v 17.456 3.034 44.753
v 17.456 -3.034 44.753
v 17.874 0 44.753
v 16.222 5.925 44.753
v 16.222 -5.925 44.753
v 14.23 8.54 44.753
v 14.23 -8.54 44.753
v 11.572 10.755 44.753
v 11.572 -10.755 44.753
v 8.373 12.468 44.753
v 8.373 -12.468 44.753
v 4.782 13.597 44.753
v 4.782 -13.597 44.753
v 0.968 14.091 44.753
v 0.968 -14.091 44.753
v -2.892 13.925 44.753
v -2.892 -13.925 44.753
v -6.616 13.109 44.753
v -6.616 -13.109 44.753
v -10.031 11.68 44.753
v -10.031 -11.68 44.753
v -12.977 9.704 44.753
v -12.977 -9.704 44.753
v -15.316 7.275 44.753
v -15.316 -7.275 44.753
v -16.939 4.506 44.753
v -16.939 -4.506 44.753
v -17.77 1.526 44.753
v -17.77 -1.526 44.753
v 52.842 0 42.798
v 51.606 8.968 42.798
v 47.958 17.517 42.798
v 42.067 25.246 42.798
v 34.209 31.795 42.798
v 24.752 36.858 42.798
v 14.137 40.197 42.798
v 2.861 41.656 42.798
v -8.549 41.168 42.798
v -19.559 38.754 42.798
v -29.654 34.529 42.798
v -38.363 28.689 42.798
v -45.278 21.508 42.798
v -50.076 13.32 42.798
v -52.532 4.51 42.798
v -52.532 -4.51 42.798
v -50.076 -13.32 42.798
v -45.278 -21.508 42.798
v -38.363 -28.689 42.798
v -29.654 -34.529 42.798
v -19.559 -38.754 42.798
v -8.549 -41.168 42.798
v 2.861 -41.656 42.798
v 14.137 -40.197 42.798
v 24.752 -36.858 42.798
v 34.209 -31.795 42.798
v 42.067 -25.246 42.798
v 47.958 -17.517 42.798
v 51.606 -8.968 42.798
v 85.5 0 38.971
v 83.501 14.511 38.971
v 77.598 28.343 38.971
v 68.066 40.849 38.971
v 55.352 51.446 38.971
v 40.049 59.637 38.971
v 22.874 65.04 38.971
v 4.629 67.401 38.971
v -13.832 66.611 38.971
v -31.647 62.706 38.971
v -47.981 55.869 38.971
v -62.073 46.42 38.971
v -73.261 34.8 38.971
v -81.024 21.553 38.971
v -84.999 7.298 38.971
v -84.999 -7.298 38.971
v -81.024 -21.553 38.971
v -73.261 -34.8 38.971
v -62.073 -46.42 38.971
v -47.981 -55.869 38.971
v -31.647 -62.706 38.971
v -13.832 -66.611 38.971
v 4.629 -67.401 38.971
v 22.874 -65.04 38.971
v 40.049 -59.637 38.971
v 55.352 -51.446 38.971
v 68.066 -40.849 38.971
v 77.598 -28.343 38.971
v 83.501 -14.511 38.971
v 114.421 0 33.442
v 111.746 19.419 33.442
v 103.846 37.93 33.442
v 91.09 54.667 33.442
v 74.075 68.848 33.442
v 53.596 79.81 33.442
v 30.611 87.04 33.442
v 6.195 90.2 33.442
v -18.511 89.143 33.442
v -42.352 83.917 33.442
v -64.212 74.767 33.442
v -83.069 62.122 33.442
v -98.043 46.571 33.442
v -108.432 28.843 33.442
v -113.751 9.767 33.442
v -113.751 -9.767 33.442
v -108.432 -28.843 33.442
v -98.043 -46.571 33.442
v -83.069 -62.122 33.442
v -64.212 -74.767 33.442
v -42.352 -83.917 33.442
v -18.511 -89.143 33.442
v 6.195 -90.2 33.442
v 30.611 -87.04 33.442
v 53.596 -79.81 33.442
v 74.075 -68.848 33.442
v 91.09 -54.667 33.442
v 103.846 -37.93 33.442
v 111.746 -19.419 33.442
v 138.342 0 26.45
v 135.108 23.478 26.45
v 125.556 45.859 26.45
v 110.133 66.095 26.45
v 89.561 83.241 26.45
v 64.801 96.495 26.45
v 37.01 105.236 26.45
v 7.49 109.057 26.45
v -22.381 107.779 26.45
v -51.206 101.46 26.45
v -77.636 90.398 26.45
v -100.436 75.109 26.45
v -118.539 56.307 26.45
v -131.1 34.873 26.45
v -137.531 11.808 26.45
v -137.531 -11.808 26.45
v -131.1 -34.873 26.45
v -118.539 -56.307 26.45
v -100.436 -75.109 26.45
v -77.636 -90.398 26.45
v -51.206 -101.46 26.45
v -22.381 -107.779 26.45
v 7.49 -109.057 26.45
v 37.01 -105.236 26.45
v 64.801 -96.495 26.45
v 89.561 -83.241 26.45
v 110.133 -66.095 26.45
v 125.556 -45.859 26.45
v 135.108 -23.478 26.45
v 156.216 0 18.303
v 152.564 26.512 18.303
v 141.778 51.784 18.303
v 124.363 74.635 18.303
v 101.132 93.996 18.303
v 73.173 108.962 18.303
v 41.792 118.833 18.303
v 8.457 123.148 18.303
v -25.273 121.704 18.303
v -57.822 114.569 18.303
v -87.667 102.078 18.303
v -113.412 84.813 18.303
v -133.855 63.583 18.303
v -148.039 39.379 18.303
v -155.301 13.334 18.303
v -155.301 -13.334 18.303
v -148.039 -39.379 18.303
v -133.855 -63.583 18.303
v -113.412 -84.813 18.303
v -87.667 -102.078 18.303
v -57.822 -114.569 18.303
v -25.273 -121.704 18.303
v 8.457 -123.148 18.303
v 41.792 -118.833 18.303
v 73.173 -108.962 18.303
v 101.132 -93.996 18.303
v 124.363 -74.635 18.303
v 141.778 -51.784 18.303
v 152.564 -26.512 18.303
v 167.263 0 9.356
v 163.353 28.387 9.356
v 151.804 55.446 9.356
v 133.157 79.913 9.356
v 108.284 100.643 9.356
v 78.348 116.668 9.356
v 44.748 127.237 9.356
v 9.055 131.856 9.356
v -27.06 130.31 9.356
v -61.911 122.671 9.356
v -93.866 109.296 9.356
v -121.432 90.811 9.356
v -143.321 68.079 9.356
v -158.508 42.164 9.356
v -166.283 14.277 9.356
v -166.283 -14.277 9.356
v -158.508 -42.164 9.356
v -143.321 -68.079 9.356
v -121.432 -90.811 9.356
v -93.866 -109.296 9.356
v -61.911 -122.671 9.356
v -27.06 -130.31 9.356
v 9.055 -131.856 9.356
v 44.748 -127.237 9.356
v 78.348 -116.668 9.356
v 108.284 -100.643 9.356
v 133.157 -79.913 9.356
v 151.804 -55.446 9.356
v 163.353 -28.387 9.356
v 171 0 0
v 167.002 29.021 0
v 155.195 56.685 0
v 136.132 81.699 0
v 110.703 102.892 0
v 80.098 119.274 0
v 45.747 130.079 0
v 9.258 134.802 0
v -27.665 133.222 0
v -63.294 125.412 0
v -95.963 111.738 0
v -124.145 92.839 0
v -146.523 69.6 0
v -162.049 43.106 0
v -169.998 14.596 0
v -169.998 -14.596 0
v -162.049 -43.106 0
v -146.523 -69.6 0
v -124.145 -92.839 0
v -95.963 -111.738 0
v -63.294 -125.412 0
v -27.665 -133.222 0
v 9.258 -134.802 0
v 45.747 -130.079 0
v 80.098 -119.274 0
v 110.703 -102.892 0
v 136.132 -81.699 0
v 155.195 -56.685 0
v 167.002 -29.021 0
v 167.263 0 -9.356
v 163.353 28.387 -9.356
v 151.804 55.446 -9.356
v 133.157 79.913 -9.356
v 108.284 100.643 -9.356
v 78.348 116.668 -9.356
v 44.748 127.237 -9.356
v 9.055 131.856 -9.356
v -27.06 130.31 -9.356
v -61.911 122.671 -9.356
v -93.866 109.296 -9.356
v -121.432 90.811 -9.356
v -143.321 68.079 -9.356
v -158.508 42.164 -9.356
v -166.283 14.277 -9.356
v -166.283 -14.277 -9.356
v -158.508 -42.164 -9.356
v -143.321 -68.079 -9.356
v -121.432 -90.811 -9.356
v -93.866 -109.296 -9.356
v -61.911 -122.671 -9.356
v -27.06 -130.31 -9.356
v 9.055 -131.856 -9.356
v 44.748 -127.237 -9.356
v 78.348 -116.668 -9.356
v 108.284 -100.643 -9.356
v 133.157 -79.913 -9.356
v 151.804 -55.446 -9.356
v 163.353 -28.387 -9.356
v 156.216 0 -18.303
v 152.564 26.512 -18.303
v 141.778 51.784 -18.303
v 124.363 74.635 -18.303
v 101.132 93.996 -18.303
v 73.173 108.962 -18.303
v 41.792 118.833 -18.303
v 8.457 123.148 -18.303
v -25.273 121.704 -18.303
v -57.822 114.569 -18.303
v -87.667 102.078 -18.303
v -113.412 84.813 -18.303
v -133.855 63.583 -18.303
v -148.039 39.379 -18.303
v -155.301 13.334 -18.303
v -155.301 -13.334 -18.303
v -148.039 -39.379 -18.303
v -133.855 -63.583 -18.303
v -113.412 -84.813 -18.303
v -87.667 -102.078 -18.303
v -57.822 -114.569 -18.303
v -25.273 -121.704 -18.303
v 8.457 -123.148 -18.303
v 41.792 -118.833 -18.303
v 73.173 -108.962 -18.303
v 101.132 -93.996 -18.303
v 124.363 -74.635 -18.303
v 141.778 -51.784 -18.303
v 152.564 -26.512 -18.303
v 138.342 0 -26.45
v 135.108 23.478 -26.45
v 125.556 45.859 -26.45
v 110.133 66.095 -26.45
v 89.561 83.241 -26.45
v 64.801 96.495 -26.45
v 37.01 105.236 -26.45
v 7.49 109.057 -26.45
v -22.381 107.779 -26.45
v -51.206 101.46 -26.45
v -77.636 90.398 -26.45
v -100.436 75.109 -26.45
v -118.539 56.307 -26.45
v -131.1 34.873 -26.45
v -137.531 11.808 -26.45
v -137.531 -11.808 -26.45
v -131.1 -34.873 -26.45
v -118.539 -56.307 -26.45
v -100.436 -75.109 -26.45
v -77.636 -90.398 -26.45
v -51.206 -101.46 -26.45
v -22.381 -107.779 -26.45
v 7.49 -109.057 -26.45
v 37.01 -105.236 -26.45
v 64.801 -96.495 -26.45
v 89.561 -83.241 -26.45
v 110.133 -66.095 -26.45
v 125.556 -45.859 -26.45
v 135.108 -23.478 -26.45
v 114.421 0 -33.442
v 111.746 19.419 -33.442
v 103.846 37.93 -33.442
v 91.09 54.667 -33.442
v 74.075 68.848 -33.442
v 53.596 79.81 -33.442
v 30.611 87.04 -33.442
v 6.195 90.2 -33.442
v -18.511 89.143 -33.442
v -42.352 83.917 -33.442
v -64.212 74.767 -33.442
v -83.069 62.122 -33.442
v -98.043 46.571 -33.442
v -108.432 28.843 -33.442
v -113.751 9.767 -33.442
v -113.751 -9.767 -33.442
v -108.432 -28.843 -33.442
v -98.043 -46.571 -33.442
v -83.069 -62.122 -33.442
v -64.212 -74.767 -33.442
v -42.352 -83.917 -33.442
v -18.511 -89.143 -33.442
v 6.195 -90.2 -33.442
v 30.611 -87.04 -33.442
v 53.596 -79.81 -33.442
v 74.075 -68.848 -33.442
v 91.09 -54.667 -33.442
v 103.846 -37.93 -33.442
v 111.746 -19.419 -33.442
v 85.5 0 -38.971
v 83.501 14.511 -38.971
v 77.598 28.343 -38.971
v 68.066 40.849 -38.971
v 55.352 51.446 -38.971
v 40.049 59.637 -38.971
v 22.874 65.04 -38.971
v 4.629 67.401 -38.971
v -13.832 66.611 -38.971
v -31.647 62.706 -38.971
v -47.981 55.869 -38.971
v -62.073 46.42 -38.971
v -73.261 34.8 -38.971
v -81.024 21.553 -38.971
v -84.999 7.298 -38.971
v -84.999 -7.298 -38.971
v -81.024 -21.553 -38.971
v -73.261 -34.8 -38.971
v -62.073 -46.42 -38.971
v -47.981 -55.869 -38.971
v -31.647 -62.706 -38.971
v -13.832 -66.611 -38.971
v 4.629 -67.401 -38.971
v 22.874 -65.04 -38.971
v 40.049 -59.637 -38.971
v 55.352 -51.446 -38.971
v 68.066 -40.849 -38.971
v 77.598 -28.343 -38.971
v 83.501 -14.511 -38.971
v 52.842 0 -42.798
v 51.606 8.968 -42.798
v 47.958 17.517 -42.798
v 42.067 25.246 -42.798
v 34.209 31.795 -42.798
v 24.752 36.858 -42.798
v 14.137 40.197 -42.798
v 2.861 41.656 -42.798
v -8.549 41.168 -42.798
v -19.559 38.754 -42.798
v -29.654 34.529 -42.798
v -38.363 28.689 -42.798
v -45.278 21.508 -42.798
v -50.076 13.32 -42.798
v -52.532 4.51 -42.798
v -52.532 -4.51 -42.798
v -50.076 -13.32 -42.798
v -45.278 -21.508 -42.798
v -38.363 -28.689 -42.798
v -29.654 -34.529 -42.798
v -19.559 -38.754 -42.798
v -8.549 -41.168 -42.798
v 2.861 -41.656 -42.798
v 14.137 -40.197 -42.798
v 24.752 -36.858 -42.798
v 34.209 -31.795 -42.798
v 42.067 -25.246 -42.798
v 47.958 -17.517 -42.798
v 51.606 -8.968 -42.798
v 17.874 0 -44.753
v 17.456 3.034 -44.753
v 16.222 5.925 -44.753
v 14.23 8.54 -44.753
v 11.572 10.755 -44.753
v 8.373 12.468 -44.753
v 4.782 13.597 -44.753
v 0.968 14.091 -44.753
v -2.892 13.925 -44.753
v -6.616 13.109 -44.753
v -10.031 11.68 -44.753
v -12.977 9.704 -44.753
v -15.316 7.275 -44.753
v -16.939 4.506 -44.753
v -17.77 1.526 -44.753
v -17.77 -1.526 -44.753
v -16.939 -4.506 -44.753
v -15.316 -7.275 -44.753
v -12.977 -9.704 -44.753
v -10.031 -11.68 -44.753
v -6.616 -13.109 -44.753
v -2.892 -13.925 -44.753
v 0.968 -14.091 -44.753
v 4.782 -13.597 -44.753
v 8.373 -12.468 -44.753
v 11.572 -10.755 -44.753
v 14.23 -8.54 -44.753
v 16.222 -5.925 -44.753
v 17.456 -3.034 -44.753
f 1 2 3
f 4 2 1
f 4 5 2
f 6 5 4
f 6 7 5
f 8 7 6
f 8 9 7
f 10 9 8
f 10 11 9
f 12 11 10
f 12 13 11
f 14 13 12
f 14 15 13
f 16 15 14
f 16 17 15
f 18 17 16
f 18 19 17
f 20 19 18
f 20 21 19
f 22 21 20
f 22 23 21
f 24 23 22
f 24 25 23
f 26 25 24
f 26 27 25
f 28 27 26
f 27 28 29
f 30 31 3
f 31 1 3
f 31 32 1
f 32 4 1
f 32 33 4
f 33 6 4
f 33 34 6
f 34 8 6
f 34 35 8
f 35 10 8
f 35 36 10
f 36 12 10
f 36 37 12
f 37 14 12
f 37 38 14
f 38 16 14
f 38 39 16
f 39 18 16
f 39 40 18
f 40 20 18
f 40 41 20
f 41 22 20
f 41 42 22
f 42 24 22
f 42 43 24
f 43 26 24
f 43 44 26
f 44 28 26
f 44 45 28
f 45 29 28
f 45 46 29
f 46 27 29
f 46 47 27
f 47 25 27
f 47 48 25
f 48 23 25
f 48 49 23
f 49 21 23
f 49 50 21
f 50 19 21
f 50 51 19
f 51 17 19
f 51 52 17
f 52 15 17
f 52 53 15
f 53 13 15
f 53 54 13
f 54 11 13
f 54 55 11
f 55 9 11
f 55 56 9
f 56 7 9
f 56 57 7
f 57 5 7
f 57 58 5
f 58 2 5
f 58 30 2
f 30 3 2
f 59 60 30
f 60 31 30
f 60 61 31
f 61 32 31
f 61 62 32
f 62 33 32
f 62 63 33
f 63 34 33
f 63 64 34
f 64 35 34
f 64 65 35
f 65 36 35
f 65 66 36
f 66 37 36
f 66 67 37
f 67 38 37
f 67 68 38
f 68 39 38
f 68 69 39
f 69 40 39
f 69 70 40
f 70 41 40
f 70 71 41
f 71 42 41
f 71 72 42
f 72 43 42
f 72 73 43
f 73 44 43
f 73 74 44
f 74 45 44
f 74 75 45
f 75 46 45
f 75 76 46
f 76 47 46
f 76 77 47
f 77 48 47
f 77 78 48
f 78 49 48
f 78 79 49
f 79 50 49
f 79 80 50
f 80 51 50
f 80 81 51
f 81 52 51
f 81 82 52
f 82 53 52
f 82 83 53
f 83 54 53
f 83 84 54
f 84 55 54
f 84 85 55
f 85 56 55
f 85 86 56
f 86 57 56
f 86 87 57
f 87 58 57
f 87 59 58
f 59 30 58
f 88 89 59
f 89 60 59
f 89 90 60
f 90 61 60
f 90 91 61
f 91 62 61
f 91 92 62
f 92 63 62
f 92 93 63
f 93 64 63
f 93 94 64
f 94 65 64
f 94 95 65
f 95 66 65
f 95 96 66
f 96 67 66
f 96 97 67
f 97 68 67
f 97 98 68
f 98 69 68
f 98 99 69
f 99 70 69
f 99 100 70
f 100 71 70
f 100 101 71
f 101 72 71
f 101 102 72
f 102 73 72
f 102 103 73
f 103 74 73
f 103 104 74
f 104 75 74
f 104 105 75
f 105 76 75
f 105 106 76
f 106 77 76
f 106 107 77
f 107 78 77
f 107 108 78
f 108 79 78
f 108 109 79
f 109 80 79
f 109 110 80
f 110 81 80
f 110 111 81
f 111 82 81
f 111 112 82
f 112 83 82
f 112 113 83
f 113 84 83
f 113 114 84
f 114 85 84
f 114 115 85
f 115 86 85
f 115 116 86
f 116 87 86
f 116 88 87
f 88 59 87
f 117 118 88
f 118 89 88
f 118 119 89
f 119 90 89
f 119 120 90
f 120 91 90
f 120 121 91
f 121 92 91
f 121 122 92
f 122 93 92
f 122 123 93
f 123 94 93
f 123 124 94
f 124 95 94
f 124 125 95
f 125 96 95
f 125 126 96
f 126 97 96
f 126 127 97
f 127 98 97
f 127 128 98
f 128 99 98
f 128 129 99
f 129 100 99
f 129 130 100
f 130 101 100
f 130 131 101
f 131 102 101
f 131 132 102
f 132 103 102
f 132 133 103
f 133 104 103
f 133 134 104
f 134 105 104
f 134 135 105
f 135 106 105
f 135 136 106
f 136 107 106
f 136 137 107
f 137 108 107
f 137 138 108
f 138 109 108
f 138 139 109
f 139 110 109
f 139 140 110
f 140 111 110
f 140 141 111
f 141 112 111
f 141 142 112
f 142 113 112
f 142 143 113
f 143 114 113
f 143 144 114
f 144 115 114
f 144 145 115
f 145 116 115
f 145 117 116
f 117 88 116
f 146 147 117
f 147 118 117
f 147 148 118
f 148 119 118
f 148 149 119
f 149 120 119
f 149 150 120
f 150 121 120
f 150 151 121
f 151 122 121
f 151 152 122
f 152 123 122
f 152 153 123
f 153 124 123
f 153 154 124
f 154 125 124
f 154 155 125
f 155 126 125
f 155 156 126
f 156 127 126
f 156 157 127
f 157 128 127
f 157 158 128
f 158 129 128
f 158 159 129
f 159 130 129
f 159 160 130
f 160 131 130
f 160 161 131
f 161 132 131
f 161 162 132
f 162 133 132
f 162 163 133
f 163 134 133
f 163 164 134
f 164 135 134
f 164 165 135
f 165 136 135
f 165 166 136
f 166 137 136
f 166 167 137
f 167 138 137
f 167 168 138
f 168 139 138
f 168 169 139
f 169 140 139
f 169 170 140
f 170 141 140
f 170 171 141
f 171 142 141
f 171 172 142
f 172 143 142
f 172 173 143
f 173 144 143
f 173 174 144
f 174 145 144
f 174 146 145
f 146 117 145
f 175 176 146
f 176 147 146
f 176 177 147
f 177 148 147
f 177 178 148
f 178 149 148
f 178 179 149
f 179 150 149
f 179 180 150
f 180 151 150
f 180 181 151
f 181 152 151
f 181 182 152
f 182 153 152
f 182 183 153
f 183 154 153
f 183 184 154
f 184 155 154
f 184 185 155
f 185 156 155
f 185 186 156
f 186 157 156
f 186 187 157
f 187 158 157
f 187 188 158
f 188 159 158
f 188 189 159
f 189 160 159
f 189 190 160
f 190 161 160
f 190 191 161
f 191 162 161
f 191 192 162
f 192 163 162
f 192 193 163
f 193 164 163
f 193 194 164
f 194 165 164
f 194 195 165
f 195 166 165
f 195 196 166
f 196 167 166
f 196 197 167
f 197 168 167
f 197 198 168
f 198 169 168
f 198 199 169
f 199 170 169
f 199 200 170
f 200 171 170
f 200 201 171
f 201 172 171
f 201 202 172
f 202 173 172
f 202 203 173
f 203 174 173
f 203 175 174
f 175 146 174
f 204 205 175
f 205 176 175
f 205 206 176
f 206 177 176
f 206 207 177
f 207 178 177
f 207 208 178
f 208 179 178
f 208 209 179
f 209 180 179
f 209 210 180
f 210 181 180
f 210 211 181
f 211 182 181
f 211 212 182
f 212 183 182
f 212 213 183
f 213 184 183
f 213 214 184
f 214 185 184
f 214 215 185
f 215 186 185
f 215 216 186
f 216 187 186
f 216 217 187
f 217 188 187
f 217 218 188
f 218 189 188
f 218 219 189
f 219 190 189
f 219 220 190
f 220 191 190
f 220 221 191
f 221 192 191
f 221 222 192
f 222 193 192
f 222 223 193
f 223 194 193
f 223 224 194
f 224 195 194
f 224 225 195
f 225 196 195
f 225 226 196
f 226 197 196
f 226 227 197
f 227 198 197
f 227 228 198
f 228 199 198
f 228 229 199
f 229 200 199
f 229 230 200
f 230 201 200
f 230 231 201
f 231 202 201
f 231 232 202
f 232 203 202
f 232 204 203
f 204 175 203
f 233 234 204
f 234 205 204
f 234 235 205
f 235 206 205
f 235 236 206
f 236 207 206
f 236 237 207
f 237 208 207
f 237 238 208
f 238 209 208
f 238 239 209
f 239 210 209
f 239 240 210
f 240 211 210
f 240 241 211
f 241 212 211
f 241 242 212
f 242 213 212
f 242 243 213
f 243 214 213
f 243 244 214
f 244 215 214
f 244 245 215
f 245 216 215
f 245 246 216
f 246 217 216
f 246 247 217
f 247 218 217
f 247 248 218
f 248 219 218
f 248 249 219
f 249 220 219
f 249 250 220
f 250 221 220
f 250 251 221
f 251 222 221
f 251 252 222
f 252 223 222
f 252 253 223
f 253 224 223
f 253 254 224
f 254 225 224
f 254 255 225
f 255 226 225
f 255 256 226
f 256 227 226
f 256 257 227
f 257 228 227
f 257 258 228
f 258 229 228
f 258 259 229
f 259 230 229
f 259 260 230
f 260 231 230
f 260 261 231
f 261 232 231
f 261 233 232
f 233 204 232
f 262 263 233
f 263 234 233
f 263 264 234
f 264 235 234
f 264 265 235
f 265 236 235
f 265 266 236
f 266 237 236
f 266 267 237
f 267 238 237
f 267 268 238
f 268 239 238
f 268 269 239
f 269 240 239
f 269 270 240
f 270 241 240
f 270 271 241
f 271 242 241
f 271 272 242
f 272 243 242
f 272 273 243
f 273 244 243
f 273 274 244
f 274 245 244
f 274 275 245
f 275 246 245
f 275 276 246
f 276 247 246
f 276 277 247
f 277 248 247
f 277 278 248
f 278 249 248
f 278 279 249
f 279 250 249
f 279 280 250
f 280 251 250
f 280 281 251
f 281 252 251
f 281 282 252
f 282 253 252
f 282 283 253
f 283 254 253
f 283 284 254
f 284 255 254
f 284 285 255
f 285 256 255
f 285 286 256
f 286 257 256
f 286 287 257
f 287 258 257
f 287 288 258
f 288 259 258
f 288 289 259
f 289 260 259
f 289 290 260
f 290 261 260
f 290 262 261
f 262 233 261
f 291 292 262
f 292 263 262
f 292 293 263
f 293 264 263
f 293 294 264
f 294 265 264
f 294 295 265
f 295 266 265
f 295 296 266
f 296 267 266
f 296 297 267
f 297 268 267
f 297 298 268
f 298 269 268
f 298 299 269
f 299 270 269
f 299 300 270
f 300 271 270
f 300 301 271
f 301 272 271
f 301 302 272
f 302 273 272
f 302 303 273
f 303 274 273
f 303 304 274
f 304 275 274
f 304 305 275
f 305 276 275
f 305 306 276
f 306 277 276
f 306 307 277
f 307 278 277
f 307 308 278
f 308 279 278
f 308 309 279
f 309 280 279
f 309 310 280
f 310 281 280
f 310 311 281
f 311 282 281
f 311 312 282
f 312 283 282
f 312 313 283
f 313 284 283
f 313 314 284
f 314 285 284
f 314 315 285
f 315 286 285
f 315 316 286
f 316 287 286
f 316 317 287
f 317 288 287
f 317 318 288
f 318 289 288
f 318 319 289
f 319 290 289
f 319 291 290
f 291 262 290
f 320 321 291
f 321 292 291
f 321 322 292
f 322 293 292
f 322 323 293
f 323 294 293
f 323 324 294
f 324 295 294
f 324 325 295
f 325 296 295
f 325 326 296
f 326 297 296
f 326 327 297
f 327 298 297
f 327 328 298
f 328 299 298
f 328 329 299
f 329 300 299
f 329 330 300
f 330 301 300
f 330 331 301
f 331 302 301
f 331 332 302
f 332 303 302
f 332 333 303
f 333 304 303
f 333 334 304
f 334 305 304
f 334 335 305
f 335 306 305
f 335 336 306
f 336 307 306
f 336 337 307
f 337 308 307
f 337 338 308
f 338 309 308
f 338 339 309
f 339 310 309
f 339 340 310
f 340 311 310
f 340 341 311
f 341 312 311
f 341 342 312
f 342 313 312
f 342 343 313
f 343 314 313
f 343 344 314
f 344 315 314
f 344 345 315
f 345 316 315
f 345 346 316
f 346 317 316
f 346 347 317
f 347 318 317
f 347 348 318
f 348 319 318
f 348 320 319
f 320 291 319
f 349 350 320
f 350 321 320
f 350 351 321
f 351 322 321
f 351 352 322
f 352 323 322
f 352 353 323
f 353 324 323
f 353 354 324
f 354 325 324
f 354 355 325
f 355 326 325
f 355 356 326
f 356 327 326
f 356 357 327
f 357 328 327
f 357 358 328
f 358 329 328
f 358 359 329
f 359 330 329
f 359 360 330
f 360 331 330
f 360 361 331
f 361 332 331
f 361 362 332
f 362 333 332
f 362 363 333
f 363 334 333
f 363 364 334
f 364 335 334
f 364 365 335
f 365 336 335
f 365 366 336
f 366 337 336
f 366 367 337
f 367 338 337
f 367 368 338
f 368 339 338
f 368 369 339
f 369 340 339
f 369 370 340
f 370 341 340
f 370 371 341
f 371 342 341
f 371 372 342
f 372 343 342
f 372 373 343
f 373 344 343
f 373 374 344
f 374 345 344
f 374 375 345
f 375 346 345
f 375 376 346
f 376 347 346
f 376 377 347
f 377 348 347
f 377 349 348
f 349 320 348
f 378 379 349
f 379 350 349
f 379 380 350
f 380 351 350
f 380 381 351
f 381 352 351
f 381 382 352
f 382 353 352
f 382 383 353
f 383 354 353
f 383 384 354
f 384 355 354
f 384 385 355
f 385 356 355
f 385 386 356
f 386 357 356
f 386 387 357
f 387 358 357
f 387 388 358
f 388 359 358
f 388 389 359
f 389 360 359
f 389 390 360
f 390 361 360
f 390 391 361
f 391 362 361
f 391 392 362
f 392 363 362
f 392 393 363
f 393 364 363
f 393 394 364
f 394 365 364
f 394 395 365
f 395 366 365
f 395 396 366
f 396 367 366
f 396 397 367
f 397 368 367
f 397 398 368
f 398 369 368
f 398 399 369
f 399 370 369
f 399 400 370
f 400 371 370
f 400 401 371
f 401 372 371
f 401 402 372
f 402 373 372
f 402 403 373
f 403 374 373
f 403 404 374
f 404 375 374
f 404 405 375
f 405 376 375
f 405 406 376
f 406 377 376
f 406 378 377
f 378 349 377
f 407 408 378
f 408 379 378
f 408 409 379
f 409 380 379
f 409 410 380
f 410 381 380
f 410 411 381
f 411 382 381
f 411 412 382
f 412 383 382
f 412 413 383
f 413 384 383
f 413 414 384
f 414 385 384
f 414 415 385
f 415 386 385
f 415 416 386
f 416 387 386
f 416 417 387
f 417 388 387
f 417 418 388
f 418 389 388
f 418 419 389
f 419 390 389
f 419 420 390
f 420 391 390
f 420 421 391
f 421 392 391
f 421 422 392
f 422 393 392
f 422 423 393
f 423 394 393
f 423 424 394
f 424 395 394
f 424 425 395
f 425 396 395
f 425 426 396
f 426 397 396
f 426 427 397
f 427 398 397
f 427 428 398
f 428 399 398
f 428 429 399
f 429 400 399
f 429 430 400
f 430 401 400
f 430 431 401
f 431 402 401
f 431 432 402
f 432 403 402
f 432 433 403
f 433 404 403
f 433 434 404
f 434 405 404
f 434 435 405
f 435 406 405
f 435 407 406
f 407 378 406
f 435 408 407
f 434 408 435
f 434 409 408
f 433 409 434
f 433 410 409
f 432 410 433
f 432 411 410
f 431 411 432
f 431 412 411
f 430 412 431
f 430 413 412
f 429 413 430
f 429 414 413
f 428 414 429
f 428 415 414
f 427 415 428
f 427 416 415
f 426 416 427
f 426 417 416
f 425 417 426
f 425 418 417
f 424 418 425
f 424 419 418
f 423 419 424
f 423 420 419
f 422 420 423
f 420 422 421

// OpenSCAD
// Generated by SolidPython 1.0.1 on 2020-07-29 00:46:54


scale(v = [19, 15, 5]) {
	sphere(r = 9);
}
/***********************************************
*********      SolidPython code:      **********
************************************************
 
# import packages: SolidPython
from solid import *
from solid.utils import *
from itertools import chain, combinations, permutations


class Resize:

    def __init__(self, scad_file):
        self.scad_file = scad_file
        #self.scad_file = import_scad(scad_file)
        # cone/cylinder param:
        self.r1 = 0
        self.r2 = 0
        self.h = 0
        # rectangular prism param:
        self.w = 0
        self.l = 0
        # ellipse param:
        self.r = 0

    # import OpenScad code (file name corresponds to shape)


    # classify shape + parameters
    def assign(self, param1, param2, param3):
        if self.scad_file == 'cone.scad':
            self.r1 = param1
            self.r2 = param2
            self.h = param3
        elif self.scad_file == 'cylinder.scad':
            self.r1 = param1
            self.r2 = param2
            self.h = param3
        elif self.scad_file == 'rectangularPrism.scad':
            self.h = param1
            self.l = param2
            self.w = param3
        else:
            self.r = param1
            self.h = param2

    # resize parameters
    def iterate(self):
        x = range(3, 20, 2)
        i = 1
        if self.scad_file == 'cone.scad':
            tempList = list(permutations(x, 2))
            for temp in tempList:
                param1 = temp[0]
                param2 = temp[1]
                filepath = 'produced_scad_files/' + 'cone' + str(param1) + '_' + str(param2) + '_' + '.scad'
                scad_render_to_file(cylinder(h=param1, r1=param2, r2=0), filepath)

        elif self.scad_file == 'cylinder.scad':
            tempList = list(permutations(x, 3))
            for temp in tempList:
                param1 = temp[0]
                param2 = temp[1]
                filepath = 'produced_scad_files/' + 'cylinder' + str(param1) + '_' + str(param2) + '_' + '.scad'
                scad_render_to_file(cylinder(h=param1, r1=param2, r2=param2), filepath)

        elif self.scad_file == 'rectangularPrism.scad':
            tempList = list(permutations(x, 3))
            for temp in tempList:
                param1 = temp[0]
                param2 = temp[1]
                param3 = temp[2]
                filepath = 'produced_scad_files/' + 'rectangularPrism' + str(param1) + '_' + str(param2) + '_' + str(
                    param3) + '.scad'
                scad_render_to_file(cube(size=(param1, param2, param3)), filepath)

        elif self.scad_file == 'ellipse.scad':
            tempList = list(permutations(x, 4))
            for temp in tempList:
                param1 = temp[0]
                param2 = temp[1]
                param3 = temp[2]
                param4 = temp[3]
                filepath = 'produced_scad_files/' + 'ellipse' + str(param1) + '_' + str(param2) + '_' + str(param3) + '_' + str(param4) + '.scad'
                scad_render_to_file(scale([param1, param2, param3])(sphere(r=param4)), filepath)

    def render_to_scadfile(self):
        scad_render_to_file(scad, 'example.scad') 
 
************************************************/
